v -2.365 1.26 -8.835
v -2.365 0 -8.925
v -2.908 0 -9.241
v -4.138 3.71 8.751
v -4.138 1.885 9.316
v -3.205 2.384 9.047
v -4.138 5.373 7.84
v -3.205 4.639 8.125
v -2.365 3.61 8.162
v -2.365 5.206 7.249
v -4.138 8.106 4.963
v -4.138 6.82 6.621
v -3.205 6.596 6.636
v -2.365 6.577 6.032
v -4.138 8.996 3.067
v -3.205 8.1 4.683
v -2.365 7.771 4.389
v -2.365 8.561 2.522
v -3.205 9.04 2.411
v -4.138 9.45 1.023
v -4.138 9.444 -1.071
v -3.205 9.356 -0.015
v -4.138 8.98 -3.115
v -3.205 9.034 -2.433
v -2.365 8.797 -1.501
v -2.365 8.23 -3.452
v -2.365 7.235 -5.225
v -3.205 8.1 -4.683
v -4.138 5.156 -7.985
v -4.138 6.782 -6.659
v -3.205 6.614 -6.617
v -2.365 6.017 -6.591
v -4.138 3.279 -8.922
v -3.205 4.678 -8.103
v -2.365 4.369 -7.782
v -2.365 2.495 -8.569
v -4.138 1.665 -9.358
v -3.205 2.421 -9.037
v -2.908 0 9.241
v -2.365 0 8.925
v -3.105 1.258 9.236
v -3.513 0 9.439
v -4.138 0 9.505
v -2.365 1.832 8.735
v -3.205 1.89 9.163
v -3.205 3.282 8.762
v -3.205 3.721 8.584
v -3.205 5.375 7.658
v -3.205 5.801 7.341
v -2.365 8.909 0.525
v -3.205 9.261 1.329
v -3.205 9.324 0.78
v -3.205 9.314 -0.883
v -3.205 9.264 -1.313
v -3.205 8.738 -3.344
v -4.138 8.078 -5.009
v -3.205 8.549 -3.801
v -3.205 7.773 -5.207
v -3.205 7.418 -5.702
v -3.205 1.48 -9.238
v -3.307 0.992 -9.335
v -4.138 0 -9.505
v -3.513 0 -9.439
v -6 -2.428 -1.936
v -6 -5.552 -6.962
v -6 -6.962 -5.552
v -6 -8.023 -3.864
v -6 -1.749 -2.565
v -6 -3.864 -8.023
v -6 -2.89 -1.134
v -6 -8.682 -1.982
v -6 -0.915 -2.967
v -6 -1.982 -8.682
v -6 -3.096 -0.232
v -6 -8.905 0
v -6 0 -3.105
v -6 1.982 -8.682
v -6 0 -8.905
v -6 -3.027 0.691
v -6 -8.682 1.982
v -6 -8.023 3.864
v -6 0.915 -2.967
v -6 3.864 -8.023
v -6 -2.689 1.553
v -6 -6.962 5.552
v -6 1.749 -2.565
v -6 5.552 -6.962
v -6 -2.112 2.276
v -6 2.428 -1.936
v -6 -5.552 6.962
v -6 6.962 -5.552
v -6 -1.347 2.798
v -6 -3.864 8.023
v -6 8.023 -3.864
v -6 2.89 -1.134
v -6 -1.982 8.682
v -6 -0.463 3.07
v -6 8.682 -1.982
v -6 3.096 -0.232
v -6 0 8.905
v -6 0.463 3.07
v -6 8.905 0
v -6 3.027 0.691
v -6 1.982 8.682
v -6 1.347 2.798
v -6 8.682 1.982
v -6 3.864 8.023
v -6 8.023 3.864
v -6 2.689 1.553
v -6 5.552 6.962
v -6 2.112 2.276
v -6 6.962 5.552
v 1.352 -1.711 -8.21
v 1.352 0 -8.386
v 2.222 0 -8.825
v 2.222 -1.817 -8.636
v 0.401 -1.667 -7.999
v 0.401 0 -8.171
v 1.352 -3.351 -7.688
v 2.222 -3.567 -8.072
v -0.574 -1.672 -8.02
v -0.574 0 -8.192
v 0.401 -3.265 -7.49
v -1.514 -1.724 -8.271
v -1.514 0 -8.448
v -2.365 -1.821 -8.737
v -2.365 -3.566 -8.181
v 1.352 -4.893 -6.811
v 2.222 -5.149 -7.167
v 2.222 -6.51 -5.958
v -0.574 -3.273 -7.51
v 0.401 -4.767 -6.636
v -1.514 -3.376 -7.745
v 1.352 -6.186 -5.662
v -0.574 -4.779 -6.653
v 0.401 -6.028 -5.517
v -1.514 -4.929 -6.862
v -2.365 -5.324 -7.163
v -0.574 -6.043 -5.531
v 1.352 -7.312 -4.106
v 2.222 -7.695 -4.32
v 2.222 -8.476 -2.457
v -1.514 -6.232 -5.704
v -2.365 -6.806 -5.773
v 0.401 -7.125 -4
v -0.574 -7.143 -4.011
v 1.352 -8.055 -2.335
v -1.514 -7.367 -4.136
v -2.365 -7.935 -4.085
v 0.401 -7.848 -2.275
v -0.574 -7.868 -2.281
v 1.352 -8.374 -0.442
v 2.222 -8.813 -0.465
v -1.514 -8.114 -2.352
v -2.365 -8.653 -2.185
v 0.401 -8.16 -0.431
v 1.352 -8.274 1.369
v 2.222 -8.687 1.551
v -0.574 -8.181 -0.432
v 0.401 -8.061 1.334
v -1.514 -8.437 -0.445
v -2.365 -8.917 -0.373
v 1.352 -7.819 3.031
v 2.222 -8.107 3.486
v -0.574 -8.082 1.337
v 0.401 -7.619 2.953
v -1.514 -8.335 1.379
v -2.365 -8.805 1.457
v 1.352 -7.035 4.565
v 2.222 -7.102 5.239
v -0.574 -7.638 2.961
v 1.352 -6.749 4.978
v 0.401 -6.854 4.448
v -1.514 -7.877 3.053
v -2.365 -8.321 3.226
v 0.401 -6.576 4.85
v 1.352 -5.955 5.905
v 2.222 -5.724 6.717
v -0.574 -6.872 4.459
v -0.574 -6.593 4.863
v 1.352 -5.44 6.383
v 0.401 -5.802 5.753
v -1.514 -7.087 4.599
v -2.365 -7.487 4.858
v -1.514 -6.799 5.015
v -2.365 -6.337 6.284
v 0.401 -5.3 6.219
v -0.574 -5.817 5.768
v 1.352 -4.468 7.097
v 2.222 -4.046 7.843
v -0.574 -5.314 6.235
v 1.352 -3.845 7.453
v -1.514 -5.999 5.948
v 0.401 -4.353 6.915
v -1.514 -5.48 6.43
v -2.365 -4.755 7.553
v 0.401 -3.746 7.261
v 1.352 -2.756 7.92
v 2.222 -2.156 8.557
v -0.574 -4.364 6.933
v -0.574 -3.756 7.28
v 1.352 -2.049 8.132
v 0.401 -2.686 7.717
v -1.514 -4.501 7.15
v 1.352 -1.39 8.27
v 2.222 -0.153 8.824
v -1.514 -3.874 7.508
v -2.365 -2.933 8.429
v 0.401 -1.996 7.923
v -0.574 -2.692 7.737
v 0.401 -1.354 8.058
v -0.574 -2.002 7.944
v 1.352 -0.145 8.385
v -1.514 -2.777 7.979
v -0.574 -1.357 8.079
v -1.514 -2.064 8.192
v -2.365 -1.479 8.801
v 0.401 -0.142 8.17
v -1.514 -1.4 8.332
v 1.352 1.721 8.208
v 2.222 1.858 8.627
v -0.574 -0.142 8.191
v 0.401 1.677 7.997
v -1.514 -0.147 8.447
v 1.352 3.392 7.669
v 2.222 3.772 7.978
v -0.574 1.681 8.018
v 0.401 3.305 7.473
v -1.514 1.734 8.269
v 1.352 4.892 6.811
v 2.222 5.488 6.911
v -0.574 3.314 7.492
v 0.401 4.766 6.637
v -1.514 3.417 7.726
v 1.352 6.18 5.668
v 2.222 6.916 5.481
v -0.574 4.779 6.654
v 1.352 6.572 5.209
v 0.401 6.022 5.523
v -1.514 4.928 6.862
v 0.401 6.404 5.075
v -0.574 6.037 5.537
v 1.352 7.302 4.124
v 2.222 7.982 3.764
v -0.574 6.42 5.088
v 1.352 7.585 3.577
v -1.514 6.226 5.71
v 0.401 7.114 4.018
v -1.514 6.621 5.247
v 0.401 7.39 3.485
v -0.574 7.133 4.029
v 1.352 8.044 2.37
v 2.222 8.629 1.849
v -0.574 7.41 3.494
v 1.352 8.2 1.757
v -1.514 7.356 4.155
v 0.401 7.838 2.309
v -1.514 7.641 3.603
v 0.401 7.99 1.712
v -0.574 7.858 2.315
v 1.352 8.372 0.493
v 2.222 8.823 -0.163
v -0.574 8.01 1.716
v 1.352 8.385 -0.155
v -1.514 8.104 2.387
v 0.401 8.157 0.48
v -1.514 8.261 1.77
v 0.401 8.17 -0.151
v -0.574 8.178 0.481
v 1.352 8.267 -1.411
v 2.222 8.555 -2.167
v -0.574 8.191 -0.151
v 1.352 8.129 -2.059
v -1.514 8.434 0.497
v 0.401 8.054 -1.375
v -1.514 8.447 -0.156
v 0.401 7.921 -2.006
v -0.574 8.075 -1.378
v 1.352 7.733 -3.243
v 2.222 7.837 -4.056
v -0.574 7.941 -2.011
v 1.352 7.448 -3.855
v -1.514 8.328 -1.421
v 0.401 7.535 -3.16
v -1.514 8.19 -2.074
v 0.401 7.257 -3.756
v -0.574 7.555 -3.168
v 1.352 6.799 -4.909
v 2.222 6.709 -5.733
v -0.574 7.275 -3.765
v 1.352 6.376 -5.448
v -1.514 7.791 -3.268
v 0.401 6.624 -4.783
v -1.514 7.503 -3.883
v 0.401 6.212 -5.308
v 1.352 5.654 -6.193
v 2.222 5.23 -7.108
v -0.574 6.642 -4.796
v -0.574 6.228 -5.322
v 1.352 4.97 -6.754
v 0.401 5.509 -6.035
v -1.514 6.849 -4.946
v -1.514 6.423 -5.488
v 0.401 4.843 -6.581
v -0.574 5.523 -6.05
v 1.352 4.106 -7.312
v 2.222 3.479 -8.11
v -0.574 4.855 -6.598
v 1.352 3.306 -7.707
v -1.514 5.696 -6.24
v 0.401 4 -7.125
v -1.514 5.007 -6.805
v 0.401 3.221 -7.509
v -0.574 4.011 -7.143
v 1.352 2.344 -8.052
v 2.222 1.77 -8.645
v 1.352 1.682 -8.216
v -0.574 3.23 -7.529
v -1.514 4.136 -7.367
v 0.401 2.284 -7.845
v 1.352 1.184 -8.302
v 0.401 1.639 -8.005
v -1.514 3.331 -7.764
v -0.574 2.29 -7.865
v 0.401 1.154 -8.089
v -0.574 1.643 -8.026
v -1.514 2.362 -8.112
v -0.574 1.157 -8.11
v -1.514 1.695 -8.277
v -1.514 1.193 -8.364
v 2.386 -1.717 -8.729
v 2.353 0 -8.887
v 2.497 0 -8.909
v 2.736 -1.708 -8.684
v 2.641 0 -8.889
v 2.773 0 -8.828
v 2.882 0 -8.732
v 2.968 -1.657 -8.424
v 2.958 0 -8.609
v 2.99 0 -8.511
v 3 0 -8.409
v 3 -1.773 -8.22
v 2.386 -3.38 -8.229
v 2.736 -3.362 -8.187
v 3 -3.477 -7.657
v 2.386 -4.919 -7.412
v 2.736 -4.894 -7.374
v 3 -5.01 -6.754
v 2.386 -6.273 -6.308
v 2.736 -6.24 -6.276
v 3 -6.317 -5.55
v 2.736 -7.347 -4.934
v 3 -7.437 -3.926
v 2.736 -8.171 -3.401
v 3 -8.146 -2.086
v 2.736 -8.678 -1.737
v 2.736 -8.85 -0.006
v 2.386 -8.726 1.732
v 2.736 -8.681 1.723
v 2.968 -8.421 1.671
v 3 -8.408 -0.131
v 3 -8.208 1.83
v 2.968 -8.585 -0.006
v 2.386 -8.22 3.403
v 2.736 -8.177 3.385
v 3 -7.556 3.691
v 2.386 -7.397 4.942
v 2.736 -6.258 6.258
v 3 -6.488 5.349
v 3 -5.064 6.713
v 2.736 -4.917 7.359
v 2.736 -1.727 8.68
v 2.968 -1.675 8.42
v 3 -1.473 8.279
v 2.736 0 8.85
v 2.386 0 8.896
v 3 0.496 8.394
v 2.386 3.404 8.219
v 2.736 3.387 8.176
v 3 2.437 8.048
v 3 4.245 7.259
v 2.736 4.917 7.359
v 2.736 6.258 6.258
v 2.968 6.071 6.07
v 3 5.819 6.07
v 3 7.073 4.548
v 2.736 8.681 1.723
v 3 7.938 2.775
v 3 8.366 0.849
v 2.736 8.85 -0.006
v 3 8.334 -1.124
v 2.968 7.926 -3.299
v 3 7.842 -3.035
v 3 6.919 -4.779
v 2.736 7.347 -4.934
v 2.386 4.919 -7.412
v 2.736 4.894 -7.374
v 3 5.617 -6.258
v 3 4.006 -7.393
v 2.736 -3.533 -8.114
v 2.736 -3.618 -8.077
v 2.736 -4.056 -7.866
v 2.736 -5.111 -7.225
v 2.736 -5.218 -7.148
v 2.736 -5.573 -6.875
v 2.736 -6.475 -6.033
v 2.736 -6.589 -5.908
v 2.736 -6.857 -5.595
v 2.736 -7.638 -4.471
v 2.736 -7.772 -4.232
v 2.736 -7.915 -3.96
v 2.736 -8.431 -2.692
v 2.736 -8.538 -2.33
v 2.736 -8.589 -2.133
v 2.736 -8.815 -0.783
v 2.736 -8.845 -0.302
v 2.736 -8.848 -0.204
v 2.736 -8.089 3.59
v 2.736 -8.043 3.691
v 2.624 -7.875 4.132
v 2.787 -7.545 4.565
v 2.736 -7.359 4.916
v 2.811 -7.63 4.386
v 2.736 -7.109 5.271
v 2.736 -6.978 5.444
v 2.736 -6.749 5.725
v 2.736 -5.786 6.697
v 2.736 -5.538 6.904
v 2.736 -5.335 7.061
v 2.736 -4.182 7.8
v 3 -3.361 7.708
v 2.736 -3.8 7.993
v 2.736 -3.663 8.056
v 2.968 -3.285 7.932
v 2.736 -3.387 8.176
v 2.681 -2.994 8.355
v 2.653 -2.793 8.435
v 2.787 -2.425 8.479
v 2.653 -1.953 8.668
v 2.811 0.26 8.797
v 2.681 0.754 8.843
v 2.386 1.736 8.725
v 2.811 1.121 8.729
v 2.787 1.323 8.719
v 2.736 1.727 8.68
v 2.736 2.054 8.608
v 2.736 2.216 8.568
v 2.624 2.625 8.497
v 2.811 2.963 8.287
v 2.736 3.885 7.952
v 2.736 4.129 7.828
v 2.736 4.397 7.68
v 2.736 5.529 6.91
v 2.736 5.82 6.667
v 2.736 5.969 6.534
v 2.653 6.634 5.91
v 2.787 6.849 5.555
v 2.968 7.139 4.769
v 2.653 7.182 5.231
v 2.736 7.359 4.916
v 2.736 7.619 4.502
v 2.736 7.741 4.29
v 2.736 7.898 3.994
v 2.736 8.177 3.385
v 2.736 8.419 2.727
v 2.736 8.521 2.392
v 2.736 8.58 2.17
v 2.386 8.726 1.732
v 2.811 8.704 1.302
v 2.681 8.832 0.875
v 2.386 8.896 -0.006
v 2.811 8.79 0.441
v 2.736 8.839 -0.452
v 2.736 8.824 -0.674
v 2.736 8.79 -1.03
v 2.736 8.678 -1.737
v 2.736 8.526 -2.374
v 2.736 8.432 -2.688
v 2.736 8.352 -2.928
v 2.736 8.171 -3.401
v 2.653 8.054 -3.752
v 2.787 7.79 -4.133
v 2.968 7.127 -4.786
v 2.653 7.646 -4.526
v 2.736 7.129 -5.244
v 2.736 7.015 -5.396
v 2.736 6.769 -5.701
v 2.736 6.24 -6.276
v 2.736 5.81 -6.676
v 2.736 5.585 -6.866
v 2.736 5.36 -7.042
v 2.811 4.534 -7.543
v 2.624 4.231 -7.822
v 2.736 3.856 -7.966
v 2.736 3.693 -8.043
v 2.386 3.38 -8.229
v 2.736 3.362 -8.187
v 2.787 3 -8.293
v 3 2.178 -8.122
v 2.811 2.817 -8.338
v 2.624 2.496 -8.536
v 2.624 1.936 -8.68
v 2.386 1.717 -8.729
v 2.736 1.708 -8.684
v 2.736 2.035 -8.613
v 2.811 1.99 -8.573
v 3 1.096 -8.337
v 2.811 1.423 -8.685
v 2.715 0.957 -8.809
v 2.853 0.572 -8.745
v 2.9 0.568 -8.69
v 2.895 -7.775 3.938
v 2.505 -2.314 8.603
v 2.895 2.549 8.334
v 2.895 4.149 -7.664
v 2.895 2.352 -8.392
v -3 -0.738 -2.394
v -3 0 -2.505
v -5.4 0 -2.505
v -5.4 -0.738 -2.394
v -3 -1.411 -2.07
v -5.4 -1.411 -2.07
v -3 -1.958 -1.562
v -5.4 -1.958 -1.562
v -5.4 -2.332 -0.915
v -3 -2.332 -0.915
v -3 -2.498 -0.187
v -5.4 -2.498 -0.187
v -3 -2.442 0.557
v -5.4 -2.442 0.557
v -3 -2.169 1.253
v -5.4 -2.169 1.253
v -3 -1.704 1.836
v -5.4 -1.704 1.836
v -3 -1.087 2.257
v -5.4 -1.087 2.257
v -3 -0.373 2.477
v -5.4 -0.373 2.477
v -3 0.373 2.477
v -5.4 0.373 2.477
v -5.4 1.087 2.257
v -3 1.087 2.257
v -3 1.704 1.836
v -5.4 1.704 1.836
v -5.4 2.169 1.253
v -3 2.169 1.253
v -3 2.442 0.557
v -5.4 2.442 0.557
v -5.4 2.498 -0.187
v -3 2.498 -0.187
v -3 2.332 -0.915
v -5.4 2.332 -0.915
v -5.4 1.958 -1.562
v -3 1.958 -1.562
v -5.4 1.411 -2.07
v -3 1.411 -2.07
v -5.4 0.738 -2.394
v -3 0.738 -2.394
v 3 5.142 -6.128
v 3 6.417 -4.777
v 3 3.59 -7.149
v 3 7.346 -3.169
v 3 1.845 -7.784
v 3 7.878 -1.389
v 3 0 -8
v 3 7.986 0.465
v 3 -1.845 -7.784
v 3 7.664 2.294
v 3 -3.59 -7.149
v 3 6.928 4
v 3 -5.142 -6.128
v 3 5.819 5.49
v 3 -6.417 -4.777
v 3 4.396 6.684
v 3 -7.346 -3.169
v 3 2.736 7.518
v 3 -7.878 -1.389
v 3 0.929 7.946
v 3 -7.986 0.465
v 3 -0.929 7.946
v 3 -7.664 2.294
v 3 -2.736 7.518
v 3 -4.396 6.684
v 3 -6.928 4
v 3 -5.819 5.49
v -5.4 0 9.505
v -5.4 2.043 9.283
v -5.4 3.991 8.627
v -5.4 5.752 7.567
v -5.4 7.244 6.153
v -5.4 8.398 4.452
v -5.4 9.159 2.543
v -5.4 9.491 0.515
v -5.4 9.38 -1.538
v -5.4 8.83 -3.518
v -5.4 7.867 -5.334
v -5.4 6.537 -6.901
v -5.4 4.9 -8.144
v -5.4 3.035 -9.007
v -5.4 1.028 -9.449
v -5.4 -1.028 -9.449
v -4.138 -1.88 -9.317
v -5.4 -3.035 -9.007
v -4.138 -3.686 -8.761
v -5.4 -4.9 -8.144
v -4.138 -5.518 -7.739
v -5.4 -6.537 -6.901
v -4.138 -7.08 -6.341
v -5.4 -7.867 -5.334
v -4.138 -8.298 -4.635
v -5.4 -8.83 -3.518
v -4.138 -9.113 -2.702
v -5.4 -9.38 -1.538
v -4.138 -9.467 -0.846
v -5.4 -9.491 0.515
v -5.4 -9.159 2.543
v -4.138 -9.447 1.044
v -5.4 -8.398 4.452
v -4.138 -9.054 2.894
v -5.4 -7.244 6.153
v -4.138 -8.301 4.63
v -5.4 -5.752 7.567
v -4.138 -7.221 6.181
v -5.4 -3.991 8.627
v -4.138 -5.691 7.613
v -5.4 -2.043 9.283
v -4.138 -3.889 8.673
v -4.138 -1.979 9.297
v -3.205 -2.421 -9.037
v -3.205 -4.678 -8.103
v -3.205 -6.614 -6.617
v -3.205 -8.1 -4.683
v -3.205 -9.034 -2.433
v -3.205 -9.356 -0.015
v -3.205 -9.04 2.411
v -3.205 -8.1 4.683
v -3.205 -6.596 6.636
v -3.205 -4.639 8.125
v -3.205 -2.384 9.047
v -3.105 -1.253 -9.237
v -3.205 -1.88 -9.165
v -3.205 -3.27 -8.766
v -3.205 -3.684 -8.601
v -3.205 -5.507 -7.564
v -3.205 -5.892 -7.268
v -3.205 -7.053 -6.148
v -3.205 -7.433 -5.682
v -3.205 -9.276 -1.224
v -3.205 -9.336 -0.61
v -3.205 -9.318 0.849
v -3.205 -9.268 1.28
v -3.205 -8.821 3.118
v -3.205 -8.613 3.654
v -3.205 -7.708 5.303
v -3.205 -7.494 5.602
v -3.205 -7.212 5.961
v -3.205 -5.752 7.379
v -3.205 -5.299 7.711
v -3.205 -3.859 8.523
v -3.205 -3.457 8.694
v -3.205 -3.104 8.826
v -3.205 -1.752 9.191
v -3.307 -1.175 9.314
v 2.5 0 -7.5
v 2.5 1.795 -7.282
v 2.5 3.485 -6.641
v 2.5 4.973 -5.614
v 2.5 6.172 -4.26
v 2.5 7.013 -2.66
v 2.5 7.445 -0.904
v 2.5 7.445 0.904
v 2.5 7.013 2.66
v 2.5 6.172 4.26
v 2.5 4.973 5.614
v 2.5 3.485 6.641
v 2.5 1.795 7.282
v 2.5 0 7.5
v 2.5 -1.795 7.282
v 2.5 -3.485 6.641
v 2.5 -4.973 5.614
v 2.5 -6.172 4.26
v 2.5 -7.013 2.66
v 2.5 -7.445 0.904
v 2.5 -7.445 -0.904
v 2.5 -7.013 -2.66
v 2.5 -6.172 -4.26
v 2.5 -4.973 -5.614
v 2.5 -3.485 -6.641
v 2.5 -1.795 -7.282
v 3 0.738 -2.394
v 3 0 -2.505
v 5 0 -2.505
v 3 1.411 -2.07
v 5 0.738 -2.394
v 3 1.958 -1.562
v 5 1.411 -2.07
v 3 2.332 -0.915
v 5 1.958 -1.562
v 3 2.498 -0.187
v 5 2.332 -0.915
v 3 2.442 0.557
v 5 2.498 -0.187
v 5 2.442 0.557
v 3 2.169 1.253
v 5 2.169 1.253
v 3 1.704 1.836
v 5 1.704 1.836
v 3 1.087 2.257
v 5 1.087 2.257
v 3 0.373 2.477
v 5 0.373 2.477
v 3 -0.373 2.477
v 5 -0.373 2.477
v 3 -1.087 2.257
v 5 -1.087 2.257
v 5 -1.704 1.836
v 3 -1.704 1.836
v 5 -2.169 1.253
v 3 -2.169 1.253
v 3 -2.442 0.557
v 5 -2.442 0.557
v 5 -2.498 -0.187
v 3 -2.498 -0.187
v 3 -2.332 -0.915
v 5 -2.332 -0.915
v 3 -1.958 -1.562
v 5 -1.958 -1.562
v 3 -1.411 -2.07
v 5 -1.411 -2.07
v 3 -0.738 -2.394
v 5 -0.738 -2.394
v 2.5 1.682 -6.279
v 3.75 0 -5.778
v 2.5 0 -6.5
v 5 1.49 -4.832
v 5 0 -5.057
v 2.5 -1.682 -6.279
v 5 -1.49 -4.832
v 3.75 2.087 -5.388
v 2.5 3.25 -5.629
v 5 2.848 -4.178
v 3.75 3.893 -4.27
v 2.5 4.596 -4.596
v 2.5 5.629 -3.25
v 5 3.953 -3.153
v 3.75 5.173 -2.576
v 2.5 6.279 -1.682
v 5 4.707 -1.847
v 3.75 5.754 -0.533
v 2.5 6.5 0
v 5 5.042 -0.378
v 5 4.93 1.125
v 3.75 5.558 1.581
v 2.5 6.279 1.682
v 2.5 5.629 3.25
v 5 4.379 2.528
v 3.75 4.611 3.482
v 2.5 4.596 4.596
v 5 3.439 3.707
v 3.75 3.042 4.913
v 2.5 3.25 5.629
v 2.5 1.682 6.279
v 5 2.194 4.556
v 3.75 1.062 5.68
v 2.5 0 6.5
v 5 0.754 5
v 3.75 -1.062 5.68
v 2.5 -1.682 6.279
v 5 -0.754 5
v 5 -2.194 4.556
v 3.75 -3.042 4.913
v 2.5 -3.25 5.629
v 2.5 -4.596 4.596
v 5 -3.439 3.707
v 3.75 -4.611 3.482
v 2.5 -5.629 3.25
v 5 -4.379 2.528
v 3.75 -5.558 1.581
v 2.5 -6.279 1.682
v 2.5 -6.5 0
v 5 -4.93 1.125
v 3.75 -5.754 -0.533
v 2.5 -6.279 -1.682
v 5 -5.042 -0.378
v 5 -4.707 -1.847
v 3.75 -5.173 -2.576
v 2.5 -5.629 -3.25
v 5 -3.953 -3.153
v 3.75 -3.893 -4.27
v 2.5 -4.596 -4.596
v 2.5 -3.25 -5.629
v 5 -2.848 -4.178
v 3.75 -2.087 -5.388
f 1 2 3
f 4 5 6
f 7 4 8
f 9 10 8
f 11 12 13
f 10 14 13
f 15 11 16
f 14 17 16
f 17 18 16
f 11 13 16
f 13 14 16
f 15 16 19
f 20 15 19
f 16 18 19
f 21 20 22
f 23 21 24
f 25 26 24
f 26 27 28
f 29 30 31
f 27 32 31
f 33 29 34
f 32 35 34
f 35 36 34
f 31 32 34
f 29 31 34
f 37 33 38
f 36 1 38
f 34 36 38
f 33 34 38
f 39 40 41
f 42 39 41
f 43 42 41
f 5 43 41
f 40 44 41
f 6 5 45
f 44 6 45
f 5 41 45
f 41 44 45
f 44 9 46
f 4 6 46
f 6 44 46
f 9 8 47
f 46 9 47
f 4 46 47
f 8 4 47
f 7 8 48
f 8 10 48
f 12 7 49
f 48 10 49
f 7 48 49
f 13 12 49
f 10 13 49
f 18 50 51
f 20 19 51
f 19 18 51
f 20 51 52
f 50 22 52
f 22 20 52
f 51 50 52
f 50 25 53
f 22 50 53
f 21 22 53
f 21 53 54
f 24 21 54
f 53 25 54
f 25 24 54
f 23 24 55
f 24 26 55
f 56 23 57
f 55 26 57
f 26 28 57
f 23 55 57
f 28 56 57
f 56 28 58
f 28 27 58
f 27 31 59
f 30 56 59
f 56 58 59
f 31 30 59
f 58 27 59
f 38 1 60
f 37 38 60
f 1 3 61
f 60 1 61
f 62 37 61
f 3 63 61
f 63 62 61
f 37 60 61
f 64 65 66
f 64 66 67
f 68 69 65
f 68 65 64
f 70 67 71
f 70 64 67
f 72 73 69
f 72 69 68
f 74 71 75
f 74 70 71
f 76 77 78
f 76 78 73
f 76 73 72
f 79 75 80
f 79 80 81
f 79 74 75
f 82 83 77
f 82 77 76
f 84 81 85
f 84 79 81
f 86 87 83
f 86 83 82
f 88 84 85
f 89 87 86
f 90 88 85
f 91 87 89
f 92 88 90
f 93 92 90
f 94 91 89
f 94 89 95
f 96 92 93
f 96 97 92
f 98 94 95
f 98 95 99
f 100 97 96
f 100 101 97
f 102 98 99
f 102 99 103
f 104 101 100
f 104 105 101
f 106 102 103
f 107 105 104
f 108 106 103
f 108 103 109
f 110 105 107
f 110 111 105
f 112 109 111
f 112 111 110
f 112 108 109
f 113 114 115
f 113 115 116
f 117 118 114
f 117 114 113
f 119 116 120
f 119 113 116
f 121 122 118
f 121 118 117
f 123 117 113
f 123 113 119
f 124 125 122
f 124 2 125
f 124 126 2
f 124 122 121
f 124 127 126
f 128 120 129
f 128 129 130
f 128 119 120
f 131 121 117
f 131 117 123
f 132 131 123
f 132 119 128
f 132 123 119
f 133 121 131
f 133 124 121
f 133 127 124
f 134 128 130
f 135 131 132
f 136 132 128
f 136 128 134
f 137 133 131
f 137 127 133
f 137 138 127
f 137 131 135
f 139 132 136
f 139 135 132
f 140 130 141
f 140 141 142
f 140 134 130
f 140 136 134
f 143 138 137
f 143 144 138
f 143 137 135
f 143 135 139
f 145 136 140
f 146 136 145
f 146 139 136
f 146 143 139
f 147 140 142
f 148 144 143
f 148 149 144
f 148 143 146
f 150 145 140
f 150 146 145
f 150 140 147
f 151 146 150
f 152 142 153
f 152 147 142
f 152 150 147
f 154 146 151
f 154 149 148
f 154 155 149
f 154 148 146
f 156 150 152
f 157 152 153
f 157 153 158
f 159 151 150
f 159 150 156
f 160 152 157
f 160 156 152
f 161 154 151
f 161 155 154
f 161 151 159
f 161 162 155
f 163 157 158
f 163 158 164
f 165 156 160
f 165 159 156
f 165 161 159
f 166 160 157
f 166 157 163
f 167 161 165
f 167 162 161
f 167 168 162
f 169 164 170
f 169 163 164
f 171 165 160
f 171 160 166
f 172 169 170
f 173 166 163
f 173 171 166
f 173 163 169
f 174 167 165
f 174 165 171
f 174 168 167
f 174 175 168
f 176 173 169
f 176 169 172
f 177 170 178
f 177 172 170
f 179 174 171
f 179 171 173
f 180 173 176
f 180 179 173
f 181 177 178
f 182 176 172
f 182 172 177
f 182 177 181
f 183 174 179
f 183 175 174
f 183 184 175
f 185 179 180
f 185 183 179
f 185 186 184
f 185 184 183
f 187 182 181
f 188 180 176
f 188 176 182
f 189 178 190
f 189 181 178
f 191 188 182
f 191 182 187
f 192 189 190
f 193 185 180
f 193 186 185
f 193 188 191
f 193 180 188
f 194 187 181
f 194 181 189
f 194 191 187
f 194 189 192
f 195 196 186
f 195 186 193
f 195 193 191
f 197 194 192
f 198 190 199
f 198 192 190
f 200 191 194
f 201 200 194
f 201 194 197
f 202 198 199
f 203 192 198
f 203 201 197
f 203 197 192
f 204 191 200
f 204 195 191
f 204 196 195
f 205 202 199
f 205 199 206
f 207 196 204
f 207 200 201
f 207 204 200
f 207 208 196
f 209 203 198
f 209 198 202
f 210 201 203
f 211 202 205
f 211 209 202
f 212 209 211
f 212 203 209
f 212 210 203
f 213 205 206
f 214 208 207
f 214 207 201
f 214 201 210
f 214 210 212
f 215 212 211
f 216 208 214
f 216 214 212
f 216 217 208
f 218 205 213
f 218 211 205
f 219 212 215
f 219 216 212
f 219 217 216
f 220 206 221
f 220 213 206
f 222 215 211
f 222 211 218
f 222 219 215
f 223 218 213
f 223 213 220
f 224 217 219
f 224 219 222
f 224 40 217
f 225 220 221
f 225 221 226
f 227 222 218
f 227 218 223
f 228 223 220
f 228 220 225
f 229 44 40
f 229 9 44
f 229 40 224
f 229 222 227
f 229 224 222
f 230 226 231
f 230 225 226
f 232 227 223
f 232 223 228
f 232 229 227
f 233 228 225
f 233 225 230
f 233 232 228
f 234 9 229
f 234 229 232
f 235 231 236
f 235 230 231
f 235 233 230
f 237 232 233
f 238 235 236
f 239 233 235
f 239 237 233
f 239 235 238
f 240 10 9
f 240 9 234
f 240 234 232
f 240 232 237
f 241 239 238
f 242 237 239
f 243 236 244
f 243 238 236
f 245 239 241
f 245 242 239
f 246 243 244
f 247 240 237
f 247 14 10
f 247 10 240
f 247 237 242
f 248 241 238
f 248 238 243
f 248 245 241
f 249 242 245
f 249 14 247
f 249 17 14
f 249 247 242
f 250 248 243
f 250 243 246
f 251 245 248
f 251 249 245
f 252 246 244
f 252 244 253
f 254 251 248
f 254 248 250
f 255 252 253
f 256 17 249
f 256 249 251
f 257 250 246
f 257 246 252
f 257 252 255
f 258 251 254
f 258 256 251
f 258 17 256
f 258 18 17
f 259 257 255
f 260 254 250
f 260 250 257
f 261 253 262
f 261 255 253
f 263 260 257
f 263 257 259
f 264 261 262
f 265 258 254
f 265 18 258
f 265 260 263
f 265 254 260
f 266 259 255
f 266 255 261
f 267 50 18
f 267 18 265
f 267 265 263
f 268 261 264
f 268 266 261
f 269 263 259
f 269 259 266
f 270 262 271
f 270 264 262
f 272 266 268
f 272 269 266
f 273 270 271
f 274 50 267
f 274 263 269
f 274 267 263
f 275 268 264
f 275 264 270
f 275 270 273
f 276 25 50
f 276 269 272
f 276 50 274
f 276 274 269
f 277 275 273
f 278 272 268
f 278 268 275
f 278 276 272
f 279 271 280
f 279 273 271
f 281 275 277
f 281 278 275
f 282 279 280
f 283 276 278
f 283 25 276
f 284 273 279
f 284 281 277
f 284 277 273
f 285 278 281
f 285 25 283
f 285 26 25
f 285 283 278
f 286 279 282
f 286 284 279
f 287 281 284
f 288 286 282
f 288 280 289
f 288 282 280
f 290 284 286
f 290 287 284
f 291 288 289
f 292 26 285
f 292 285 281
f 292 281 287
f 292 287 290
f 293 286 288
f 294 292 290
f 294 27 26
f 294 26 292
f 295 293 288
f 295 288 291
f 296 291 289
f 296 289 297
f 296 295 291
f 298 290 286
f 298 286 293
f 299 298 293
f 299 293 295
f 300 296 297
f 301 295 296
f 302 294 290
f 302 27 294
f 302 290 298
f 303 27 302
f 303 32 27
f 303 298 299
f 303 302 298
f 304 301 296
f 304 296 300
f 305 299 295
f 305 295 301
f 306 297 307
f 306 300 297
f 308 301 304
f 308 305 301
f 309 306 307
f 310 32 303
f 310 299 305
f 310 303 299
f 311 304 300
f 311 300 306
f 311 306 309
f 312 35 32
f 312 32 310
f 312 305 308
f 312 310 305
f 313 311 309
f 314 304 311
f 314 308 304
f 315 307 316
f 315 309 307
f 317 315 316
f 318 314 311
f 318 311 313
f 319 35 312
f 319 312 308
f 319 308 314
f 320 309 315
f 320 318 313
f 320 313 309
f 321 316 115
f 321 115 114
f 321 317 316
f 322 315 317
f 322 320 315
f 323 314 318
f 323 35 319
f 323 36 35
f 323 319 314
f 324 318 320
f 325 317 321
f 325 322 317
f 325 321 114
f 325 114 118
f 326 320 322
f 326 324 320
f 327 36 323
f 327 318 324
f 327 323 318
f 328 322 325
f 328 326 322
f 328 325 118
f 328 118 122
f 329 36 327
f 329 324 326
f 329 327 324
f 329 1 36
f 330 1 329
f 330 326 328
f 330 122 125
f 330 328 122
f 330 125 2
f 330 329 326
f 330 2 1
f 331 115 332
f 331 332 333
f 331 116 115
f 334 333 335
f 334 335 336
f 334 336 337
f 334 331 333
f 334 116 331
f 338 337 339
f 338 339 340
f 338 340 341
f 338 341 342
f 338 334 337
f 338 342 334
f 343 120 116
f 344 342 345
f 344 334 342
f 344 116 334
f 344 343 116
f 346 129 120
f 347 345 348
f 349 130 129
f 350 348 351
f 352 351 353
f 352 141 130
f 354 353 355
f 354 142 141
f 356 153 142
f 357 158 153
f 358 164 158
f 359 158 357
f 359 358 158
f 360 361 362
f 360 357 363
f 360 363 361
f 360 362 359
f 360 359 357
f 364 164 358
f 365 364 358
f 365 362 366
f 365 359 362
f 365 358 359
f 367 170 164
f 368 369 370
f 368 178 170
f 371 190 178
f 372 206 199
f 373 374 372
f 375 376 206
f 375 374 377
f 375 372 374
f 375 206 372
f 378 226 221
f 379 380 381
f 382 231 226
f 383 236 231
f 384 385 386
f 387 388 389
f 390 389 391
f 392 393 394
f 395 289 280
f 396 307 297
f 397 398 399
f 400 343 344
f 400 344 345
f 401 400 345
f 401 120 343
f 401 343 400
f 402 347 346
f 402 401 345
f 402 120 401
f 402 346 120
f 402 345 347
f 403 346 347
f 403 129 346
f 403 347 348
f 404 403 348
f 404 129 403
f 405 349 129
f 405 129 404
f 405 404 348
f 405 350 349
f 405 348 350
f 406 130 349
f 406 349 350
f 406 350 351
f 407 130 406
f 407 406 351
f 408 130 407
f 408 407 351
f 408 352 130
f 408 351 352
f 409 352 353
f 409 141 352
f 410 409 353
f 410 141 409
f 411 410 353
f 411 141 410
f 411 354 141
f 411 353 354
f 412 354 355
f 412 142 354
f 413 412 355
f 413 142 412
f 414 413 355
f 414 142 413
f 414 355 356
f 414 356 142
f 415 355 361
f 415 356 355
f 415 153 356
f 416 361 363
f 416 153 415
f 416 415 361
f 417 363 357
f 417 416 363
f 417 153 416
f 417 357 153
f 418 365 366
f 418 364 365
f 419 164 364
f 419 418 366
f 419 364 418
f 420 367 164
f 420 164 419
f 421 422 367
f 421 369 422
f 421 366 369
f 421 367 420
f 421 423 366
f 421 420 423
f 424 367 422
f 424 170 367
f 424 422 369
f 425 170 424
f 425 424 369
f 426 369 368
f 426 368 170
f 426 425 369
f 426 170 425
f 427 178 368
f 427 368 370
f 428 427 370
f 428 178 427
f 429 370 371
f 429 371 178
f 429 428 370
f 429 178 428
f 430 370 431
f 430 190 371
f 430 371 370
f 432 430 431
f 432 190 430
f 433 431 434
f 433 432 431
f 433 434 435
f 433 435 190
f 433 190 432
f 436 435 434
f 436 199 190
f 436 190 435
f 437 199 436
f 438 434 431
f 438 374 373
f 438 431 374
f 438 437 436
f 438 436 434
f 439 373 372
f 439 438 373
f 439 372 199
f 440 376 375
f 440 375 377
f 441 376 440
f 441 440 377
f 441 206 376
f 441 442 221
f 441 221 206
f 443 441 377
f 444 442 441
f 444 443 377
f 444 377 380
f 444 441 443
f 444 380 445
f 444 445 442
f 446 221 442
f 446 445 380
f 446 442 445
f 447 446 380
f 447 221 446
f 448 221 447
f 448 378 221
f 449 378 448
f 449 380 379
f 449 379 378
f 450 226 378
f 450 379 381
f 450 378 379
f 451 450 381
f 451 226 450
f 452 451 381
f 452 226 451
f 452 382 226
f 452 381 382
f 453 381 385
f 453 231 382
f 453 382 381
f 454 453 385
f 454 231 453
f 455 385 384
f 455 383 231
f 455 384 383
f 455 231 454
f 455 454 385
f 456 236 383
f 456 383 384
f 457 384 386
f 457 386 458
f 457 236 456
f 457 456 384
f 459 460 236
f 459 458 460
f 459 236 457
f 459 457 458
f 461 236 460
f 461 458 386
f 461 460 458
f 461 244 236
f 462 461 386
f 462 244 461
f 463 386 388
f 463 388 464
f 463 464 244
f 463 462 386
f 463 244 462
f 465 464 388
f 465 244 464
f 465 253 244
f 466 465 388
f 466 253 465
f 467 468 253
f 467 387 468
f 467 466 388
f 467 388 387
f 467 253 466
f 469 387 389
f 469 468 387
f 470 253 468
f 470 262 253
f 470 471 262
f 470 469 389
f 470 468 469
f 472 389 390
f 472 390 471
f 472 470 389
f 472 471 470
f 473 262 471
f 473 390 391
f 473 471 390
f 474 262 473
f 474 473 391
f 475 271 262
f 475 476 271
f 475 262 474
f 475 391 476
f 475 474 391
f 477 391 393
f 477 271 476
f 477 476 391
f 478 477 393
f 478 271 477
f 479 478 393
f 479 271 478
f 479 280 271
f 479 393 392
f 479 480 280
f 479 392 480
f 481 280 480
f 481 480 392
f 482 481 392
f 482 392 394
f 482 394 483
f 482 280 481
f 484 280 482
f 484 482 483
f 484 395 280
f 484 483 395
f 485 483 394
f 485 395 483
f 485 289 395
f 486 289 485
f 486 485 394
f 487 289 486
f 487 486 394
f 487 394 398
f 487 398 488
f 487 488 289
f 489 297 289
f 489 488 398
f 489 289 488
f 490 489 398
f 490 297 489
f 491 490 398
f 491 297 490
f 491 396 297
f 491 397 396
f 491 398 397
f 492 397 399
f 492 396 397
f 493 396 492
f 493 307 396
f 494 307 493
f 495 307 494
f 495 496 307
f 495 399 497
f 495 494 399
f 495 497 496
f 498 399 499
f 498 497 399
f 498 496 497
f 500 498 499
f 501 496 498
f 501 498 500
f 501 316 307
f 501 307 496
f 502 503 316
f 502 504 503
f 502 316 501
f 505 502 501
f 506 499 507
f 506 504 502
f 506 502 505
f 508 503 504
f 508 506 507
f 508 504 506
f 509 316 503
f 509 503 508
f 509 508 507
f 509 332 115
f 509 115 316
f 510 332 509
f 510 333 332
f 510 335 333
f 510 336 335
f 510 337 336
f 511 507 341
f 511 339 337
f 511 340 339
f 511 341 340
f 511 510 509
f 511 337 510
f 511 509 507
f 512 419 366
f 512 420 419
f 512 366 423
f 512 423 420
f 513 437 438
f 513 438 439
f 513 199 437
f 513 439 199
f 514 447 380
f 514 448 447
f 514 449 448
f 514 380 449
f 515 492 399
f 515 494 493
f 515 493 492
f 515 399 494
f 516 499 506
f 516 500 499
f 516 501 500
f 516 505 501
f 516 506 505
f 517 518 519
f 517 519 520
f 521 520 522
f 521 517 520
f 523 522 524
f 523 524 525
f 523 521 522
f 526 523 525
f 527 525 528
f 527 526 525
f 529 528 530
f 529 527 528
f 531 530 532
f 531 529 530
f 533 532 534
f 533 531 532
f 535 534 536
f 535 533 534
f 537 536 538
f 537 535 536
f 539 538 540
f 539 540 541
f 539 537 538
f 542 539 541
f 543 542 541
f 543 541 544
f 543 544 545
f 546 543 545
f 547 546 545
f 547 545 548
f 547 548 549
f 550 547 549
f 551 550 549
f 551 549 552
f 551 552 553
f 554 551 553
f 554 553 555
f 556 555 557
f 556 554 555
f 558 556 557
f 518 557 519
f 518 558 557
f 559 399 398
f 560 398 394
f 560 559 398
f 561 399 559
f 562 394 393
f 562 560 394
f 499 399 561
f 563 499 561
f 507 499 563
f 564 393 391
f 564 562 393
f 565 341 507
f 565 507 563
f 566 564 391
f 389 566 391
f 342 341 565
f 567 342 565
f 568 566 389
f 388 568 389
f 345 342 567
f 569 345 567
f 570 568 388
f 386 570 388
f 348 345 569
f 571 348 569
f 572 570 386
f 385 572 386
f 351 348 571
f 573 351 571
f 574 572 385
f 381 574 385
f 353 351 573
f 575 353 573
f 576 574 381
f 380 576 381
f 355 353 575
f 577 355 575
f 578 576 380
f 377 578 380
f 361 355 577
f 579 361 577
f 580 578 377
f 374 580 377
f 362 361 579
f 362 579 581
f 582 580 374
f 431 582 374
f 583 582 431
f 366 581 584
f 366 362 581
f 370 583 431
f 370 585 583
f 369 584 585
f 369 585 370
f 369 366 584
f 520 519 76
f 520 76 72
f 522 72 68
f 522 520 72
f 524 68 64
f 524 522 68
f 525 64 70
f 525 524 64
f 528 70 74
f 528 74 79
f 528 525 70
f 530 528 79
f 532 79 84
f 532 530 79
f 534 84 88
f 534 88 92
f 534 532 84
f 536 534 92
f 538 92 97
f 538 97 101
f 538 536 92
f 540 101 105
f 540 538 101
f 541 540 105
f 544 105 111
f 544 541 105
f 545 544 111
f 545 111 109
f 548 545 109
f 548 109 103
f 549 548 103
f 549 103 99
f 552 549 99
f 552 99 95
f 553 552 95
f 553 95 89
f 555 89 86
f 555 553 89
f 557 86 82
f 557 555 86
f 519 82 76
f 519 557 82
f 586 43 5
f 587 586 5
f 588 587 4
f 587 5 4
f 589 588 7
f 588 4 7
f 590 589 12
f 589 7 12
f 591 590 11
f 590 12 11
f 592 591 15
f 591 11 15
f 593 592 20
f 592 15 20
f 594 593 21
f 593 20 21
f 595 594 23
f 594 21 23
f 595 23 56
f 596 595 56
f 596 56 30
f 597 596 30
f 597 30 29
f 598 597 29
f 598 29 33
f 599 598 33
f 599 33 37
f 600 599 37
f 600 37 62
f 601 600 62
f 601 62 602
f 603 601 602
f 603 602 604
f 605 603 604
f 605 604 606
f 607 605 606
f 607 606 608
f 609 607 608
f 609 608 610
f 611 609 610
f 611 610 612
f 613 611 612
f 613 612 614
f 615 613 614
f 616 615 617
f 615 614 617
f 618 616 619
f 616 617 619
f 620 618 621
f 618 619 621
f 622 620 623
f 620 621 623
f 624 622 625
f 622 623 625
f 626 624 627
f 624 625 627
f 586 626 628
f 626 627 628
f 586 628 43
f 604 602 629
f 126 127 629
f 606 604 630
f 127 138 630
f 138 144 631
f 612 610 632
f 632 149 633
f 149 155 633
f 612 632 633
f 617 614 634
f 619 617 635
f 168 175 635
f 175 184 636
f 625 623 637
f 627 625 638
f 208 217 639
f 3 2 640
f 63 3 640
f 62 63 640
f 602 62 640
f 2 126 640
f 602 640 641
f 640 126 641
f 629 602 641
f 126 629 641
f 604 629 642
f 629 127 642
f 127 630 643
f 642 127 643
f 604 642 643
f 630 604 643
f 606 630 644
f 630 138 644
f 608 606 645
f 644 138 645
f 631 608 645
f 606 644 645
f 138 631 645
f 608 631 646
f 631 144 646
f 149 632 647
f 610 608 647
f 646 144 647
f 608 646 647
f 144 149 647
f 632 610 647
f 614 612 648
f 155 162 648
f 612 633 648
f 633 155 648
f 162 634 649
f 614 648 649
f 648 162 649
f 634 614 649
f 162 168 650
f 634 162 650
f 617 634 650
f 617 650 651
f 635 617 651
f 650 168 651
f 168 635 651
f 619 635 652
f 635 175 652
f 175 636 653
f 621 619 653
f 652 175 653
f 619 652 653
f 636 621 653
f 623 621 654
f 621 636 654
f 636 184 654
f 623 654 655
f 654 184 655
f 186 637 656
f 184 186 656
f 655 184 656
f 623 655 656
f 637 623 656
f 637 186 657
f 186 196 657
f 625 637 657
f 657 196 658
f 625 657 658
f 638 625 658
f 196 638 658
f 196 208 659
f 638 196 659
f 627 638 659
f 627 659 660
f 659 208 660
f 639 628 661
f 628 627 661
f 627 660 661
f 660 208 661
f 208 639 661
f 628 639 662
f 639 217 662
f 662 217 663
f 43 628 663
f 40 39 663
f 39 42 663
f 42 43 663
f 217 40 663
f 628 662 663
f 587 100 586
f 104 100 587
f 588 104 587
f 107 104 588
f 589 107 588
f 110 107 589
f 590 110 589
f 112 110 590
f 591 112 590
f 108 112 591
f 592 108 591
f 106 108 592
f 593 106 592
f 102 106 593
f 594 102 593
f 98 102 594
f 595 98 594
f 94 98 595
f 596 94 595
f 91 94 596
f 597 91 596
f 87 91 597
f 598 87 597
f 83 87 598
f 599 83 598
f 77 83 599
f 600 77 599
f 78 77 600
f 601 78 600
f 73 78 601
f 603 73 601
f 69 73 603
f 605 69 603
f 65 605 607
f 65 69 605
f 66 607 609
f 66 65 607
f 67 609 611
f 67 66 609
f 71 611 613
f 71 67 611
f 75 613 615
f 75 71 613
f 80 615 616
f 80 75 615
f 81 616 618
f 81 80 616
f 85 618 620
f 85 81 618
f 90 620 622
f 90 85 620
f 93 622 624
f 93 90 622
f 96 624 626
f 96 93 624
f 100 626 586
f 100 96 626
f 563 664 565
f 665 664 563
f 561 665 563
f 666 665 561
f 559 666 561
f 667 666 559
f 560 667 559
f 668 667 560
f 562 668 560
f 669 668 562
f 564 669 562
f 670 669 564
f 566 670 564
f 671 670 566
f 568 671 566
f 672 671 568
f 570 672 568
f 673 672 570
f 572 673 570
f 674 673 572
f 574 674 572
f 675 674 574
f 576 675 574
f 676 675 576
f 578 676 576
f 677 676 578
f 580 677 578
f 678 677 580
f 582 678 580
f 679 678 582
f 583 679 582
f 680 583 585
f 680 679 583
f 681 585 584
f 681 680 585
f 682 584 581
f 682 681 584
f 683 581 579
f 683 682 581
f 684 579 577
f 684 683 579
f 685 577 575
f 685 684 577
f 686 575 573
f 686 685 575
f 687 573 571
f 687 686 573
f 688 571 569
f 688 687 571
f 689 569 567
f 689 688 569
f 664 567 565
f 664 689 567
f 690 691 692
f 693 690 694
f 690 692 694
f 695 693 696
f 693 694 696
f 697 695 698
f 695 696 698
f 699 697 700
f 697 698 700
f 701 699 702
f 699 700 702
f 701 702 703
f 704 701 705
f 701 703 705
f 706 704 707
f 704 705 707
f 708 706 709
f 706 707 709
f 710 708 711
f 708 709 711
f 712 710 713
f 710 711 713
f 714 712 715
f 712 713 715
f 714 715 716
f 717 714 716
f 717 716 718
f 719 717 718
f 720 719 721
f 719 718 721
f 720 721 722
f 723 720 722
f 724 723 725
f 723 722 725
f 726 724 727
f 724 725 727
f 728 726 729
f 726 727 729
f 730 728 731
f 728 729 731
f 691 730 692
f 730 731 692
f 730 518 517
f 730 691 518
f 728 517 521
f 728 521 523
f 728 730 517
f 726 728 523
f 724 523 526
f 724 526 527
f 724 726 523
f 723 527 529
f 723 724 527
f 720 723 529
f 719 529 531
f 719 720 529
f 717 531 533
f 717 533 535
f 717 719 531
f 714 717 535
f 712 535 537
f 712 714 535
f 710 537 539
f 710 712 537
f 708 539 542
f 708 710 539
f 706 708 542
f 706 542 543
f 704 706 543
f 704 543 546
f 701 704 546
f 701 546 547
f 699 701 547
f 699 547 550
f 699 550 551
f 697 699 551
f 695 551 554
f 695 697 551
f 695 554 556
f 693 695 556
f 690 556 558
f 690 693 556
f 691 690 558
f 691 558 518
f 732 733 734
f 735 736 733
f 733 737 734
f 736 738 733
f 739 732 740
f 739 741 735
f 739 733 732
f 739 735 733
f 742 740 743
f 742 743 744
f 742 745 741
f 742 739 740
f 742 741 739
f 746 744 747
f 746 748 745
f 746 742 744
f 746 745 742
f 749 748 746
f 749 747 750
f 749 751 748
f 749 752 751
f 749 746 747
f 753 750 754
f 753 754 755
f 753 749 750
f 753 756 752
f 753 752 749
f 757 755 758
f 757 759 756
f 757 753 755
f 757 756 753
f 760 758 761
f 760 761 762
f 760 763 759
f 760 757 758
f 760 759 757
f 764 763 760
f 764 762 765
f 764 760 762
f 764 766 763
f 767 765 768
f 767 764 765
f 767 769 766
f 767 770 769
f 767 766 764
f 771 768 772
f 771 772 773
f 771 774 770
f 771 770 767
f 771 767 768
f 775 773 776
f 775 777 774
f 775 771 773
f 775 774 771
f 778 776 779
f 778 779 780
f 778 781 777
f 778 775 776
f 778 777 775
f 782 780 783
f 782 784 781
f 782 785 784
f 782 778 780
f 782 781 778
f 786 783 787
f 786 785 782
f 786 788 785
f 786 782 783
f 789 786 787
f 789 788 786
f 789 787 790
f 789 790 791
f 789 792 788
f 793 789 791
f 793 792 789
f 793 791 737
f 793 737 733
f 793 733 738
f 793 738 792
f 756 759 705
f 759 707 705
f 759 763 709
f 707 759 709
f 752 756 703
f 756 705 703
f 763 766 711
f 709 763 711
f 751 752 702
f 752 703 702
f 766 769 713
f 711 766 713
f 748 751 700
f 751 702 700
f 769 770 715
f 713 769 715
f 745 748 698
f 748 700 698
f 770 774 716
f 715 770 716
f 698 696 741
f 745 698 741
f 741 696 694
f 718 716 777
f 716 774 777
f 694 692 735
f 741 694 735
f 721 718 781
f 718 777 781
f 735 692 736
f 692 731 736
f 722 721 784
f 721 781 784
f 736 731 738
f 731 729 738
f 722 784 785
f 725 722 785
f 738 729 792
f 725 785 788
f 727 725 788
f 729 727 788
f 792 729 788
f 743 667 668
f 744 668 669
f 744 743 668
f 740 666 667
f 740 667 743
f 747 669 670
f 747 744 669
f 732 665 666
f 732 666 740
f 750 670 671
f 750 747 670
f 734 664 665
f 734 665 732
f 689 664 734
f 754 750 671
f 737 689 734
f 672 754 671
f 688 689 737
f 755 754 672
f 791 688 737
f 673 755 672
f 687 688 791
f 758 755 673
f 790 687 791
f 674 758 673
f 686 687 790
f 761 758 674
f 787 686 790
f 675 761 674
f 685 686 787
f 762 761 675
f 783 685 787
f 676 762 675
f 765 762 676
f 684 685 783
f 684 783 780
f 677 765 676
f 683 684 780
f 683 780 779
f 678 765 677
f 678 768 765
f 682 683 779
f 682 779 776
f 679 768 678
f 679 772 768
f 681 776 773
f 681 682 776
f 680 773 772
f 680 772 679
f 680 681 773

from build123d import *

# Parameters (mm, degrees)
SKETCH2_R           = 7
SKETCH2_R_2         = 4.5
CUT_EXTRUDE1_DEPTH  = 0.5
CHAMFER3_SIZE       = 1
BOSS_EXTRUDE1_START = 2
SKETCH3_R           = 4.5
SKETCH3_R_2         = 2.505
BOSS_EXTRUDE1_DEPTH = 2
CHAMFER4_SIZE       = 2
CHAMFER4_SIZE_2     = 3.464101615
SKETCH4_R           = 9.505
SKETCH4_R_2         = 2.505
BOSS_EXTRUDE2_DEPTH = 3
FILLET1_R           = 0.5
FILLET2_R           = 3
CHAMFER5_SIZE       = 0.6


with BuildPart() as part:
    # Sketch1 → Revolve1 (revolve)
    with BuildSketch(Plane.XY, mode=Mode.PRIVATE) as revolve1_sk:
        with BuildLine():
            Line((-3, -9.505), (-3, -2.505))
            Line((-3, -2.505), (3, -2.505))
            Line((3, -2.505), (3, -9.505))
            ThreePointArc((3, -9.505), (0, -8.150751311), (-3, -9.505))
        make_face()
    revolve(revolve1_sk.sketch.rotate(Axis((0, 0, 0), (-1, 0, 0)), 270), axis=Axis((0, 0, 0), (-1, 0, 0)))

    # Sketch2 → Cut-Extrude1 (cut)
    with BuildSketch(Plane(origin=(3, 0, 0), x_dir=(0, 0, -1), z_dir=(1, 0, 0))):
        Circle(SKETCH2_R)
        Circle(SKETCH2_R_2, mode=Mode.SUBTRACT)
    extrude(amount=-CUT_EXTRUDE1_DEPTH, mode=Mode.SUBTRACT)

    # Chamfer3
    # the kernel refuses this chamfer: 1 mm, written as the material it takes off along each edge
    with BuildSketch(Plane(origin=(3, 0, 0), x_dir=(0, 0, -1), z_dir=(0, -1, 0))) as chamfer3_piece_1_section:
        Polygon((7 + CHAMFER3_SIZE, 0), (7, -CHAMFER3_SIZE), (7, 0), align=None)
    chamfer3_piece_1 = revolve(axis=Axis((3, 0, 0), (1, 0, 0)), mode=Mode.PRIVATE)
    chamfer3_piece_1 = split(chamfer3_piece_1, bisect_by=Plane(origin=(2.5, 0, 7.745273701), z_dir=(1, 0, 0)), keep=Keep.TOP, mode=Mode.PRIVATE)
    add(chamfer3_piece_1, mode=Mode.SUBTRACT)

    # Sketch3 → Boss-Extrude1 (add)
    with BuildSketch(Plane(origin=(3, 0, 0), x_dir=(0, 0, -1), z_dir=(1, 0, 0)).offset(BOSS_EXTRUDE1_START)):
        Circle(SKETCH3_R)
        Circle(SKETCH3_R_2, mode=Mode.SUBTRACT)
    extrude(amount=-BOSS_EXTRUDE1_DEPTH)

    # Chamfer4
    # the kernel refuses this chamfer: 3.464101615, 2 mm, written as the material it adds along each edge
    with BuildSketch(Plane(origin=(2.5, 0, 0), x_dir=(0, 0, -1), z_dir=(0, -1, 0))) as chamfer4_piece_1_section:
        Polygon((4.5 + CHAMFER4_SIZE, 0), (4.5, CHAMFER4_SIZE_2), (4.5, 0), align=None)
    chamfer4_piece_1 = revolve(axis=Axis((2.5, 0, 0), (1, 0, 0)), mode=Mode.PRIVATE)
    chamfer4_piece_1 = split(chamfer4_piece_1, bisect_by=Plane(origin=(5, 0, 5.770731059), z_dir=(-1, 0, 0)), keep=Keep.TOP, mode=Mode.PRIVATE)
    add(chamfer4_piece_1)

    # Sketch4 → Boss-Extrude2 (add)
    with BuildSketch(Plane.ZY.offset(3)):
        Circle(SKETCH4_R)
        with Locations(Location((0, 0, 0), (0, 0, 180))):
            Circle(SKETCH4_R_2, mode=Mode.SUBTRACT)
    extrude(amount=BOSS_EXTRUDE2_DEPTH)

    # Fillet1
    fillet1_edges = [part.edges().sort_by_distance(p)[0] for p in [
        (3, 0, 9.505),
    ]]
    fillet(fillet1_edges, radius=FILLET1_R)

    # Fillet2
    fillet2_edges = [part.edges().sort_by_distance(p)[0] for p in [
        (-3, -9.505, 0),
    ]]
    fillet(fillet2_edges, radius=FILLET2_R)

    # Chamfer5
    chamfer5_edges = [part.edges().sort_by_distance(p)[0] for p in [
        (-6, 0, -9.505),
        (-6, 0, 2.505),
    ]]
    chamfer(chamfer5_edges, length=CHAMFER5_SIZE)


solid = part.part
